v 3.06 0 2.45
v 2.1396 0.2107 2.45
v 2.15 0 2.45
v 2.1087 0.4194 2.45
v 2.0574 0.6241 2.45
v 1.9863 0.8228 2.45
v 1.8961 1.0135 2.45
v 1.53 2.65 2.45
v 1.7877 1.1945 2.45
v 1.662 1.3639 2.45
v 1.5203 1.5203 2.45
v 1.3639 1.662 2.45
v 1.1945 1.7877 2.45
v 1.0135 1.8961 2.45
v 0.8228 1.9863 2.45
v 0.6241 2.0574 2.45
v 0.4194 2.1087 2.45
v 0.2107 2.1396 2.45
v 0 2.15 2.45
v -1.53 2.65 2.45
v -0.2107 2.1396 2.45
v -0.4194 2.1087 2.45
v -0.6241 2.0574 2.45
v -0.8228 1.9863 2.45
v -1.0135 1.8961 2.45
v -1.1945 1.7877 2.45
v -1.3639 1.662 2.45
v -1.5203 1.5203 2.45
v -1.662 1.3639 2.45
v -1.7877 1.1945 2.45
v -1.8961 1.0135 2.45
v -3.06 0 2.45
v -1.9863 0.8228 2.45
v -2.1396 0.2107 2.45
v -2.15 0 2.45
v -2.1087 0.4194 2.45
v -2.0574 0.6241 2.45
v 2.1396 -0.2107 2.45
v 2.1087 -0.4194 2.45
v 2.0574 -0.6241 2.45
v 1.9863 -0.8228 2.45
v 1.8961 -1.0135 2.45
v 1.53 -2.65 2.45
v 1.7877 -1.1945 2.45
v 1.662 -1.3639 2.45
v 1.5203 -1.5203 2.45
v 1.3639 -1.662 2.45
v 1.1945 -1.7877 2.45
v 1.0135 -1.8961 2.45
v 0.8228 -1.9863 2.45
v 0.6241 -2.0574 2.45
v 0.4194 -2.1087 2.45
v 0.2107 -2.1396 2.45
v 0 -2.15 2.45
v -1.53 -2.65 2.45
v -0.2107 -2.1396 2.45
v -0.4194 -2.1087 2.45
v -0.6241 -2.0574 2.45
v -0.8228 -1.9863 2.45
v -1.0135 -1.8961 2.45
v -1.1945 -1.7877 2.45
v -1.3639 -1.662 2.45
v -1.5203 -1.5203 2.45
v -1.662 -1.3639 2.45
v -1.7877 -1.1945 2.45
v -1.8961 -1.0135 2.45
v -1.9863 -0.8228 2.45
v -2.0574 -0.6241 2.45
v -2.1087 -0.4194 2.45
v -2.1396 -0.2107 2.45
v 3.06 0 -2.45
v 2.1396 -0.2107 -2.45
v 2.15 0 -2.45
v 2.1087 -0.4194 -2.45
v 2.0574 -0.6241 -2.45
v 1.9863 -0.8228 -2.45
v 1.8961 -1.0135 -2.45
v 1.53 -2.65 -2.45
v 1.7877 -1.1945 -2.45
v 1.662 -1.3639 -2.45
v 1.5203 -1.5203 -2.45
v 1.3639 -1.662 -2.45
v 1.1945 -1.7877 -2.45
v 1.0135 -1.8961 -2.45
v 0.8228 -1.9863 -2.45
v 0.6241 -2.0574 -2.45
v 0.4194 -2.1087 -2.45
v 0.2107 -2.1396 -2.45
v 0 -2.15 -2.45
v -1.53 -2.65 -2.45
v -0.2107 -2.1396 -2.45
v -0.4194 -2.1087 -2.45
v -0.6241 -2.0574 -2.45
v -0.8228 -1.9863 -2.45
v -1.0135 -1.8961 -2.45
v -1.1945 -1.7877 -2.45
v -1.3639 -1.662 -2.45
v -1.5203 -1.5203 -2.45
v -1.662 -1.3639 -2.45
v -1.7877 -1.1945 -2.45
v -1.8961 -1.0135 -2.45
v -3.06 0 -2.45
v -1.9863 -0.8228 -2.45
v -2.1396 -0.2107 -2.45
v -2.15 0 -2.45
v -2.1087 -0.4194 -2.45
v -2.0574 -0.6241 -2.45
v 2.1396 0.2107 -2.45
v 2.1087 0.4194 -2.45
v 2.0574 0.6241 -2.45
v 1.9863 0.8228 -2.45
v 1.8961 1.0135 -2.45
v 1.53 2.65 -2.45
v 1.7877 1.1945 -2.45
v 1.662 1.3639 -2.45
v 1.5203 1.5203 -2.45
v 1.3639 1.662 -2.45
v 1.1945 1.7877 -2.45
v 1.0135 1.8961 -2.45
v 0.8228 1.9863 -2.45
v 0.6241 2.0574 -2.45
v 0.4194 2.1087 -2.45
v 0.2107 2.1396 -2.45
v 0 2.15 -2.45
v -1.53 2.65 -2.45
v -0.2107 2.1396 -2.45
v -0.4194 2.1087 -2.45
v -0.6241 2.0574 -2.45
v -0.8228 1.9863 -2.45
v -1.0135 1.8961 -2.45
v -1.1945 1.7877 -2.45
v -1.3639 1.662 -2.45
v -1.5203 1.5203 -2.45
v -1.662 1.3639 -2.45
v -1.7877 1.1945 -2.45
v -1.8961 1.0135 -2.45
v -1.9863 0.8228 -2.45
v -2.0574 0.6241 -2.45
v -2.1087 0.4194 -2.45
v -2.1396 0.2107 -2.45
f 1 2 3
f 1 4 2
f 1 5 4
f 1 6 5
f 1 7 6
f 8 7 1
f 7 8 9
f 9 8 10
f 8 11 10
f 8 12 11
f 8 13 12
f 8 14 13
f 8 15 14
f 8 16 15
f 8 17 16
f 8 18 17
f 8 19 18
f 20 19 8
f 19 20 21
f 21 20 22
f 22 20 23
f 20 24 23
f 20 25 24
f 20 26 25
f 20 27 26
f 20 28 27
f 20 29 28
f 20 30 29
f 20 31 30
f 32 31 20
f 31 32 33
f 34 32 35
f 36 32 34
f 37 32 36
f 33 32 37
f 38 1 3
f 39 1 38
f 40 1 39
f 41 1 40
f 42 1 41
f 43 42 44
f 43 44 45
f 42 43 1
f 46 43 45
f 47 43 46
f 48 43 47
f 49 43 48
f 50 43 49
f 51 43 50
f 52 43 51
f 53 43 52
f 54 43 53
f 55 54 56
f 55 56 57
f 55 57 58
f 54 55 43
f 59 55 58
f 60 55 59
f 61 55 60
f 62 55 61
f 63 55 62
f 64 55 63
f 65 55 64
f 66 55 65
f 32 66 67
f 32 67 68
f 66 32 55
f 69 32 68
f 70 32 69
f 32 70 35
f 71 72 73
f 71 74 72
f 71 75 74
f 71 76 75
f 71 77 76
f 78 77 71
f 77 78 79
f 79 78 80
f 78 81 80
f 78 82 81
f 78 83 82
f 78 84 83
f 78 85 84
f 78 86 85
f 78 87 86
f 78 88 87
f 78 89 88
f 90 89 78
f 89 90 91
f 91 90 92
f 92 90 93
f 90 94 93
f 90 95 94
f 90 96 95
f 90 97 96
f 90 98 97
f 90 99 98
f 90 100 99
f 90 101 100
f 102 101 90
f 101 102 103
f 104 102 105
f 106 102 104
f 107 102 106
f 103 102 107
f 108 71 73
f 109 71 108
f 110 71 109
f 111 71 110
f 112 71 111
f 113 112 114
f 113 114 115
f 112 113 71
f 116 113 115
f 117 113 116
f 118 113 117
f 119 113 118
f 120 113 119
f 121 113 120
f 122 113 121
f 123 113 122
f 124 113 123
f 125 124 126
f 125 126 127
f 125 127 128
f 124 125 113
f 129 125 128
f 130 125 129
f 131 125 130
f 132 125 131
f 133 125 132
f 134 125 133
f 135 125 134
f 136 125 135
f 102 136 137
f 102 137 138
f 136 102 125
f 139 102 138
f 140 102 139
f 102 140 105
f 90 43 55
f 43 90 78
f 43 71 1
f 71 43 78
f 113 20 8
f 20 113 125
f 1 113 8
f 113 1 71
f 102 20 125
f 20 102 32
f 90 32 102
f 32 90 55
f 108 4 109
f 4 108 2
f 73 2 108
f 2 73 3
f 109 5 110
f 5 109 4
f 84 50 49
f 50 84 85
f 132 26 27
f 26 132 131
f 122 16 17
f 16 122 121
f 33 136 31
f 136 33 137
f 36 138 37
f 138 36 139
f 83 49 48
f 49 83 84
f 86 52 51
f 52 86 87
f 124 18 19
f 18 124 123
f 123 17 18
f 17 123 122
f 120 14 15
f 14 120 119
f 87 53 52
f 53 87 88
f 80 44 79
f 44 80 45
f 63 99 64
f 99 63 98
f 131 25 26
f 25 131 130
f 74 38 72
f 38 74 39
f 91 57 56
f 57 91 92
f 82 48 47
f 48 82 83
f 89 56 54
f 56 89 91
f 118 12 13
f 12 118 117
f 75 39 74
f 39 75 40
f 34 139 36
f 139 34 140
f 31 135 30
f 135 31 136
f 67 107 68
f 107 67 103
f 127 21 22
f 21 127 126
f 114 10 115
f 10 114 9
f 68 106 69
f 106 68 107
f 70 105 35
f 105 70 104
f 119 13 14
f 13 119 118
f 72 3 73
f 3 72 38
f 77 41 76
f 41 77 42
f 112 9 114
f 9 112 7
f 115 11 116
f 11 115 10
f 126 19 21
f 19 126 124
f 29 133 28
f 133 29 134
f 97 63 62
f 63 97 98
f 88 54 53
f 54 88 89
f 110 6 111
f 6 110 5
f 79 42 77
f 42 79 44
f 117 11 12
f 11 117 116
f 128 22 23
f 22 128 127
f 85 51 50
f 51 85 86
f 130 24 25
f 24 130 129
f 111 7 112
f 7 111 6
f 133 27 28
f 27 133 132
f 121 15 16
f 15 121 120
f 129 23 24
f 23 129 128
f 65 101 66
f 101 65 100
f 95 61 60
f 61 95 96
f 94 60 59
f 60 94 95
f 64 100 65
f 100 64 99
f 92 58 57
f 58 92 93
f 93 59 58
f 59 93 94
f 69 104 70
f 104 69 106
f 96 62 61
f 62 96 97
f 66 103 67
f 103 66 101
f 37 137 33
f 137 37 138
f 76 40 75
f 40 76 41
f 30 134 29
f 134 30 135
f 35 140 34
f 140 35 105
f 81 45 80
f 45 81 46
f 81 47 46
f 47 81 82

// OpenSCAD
// Hex nut for 4.0mm screws: 5.3mm across flats, 6.3mm thick

// Parameters
thread_nominal_diameter_mm = 4.0; //[2.0:8.0:0.1]
across_flats_mm = 5.3; //[2.65:10.6:0.1]
thickness_mm = 6.3; //[3.15:12.6:0.1]
clearance_diameter_mm = 4.2; //[3.5:5.5:0.05]
tap_drill_diameter_mm = 3.3; //[2.5:4.5:0.05]
tolerance_mm = 0.1; //[0.0:0.5:0.01]
hole_type_selector = 0; //[0:1:1]  // 0=clearance, 1=tap drill
chamfer_mm = 0.3; //[0.0:1.0:0.05]
chamfer_enable = 1; //[0:1:1]
overlap_mm = 0.8; //[0.5:2.0:0.1]
washer_enable = 0; //[0:1:1]
washer_outer_diameter_mm = 9.0; //[6.0:18.0:0.1]
washer_thickness_mm = 1.0; //[0.5:3.0:0.1]

function hole_r() =
    ((1 - hole_type_selector) * (clearance_diameter_mm / 2)
   + (hole_type_selector)     * (tap_drill_diameter_mm / 2))
   + tolerance_mm / 2;

function hex_R_from_flats(af) = af / sqrt(3); // circumradius for a hex with across-flats = af

module hex_prism(af, h, center=true) {
    // No rotation needed: with $fn=6, flats are aligned to X/Y axes.
    cylinder(r=hex_R_from_flats(af), h=h, center=center, $fn=6);
}

module nut() {
    R = hex_R_from_flats(across_flats_mm);

    difference() {
        // Main hex body
        hex_prism(across_flats_mm, thickness_mm, center=true);

        // Through hole
        cylinder(r=hole_r(), h=thickness_mm + 2*overlap_mm, center=true, $fn=64);

        // Chamfers (remove material at top and bottom edges)
        if (chamfer_enable && chamfer_mm > 0) {
            // Top chamfer cutter
            translate([0, 0, thickness_mm/2 - chamfer_mm/2])
                cylinder(r1=R + chamfer_mm, r2=R, h=chamfer_mm + overlap_mm, center=true, $fn=6);

            // Bottom chamfer cutter
            translate([0, 0, -thickness_mm/2 + chamfer_mm/2])
                cylinder(r1=R, r2=R + chamfer_mm, h=chamfer_mm + overlap_mm, center=true, $fn=6);
        }
    }
}

module nut_and_washer() {
    union() {
        nut();

        if (washer_enable) {
            // Washer is connected to nut with a small overlap
            translate([0, 0, -(thickness_mm/2 + washer_thickness_mm/2 - overlap_mm)])
                difference() {
                    cylinder(r=washer_outer_diameter_mm/2, h=washer_thickness_mm, center=true, $fn=96);
                    cylinder(r=hole_r(), h=washer_thickness_mm + 2*overlap_mm, center=true, $fn=64);
                }
        }
    }
}

nut_and_washer();
